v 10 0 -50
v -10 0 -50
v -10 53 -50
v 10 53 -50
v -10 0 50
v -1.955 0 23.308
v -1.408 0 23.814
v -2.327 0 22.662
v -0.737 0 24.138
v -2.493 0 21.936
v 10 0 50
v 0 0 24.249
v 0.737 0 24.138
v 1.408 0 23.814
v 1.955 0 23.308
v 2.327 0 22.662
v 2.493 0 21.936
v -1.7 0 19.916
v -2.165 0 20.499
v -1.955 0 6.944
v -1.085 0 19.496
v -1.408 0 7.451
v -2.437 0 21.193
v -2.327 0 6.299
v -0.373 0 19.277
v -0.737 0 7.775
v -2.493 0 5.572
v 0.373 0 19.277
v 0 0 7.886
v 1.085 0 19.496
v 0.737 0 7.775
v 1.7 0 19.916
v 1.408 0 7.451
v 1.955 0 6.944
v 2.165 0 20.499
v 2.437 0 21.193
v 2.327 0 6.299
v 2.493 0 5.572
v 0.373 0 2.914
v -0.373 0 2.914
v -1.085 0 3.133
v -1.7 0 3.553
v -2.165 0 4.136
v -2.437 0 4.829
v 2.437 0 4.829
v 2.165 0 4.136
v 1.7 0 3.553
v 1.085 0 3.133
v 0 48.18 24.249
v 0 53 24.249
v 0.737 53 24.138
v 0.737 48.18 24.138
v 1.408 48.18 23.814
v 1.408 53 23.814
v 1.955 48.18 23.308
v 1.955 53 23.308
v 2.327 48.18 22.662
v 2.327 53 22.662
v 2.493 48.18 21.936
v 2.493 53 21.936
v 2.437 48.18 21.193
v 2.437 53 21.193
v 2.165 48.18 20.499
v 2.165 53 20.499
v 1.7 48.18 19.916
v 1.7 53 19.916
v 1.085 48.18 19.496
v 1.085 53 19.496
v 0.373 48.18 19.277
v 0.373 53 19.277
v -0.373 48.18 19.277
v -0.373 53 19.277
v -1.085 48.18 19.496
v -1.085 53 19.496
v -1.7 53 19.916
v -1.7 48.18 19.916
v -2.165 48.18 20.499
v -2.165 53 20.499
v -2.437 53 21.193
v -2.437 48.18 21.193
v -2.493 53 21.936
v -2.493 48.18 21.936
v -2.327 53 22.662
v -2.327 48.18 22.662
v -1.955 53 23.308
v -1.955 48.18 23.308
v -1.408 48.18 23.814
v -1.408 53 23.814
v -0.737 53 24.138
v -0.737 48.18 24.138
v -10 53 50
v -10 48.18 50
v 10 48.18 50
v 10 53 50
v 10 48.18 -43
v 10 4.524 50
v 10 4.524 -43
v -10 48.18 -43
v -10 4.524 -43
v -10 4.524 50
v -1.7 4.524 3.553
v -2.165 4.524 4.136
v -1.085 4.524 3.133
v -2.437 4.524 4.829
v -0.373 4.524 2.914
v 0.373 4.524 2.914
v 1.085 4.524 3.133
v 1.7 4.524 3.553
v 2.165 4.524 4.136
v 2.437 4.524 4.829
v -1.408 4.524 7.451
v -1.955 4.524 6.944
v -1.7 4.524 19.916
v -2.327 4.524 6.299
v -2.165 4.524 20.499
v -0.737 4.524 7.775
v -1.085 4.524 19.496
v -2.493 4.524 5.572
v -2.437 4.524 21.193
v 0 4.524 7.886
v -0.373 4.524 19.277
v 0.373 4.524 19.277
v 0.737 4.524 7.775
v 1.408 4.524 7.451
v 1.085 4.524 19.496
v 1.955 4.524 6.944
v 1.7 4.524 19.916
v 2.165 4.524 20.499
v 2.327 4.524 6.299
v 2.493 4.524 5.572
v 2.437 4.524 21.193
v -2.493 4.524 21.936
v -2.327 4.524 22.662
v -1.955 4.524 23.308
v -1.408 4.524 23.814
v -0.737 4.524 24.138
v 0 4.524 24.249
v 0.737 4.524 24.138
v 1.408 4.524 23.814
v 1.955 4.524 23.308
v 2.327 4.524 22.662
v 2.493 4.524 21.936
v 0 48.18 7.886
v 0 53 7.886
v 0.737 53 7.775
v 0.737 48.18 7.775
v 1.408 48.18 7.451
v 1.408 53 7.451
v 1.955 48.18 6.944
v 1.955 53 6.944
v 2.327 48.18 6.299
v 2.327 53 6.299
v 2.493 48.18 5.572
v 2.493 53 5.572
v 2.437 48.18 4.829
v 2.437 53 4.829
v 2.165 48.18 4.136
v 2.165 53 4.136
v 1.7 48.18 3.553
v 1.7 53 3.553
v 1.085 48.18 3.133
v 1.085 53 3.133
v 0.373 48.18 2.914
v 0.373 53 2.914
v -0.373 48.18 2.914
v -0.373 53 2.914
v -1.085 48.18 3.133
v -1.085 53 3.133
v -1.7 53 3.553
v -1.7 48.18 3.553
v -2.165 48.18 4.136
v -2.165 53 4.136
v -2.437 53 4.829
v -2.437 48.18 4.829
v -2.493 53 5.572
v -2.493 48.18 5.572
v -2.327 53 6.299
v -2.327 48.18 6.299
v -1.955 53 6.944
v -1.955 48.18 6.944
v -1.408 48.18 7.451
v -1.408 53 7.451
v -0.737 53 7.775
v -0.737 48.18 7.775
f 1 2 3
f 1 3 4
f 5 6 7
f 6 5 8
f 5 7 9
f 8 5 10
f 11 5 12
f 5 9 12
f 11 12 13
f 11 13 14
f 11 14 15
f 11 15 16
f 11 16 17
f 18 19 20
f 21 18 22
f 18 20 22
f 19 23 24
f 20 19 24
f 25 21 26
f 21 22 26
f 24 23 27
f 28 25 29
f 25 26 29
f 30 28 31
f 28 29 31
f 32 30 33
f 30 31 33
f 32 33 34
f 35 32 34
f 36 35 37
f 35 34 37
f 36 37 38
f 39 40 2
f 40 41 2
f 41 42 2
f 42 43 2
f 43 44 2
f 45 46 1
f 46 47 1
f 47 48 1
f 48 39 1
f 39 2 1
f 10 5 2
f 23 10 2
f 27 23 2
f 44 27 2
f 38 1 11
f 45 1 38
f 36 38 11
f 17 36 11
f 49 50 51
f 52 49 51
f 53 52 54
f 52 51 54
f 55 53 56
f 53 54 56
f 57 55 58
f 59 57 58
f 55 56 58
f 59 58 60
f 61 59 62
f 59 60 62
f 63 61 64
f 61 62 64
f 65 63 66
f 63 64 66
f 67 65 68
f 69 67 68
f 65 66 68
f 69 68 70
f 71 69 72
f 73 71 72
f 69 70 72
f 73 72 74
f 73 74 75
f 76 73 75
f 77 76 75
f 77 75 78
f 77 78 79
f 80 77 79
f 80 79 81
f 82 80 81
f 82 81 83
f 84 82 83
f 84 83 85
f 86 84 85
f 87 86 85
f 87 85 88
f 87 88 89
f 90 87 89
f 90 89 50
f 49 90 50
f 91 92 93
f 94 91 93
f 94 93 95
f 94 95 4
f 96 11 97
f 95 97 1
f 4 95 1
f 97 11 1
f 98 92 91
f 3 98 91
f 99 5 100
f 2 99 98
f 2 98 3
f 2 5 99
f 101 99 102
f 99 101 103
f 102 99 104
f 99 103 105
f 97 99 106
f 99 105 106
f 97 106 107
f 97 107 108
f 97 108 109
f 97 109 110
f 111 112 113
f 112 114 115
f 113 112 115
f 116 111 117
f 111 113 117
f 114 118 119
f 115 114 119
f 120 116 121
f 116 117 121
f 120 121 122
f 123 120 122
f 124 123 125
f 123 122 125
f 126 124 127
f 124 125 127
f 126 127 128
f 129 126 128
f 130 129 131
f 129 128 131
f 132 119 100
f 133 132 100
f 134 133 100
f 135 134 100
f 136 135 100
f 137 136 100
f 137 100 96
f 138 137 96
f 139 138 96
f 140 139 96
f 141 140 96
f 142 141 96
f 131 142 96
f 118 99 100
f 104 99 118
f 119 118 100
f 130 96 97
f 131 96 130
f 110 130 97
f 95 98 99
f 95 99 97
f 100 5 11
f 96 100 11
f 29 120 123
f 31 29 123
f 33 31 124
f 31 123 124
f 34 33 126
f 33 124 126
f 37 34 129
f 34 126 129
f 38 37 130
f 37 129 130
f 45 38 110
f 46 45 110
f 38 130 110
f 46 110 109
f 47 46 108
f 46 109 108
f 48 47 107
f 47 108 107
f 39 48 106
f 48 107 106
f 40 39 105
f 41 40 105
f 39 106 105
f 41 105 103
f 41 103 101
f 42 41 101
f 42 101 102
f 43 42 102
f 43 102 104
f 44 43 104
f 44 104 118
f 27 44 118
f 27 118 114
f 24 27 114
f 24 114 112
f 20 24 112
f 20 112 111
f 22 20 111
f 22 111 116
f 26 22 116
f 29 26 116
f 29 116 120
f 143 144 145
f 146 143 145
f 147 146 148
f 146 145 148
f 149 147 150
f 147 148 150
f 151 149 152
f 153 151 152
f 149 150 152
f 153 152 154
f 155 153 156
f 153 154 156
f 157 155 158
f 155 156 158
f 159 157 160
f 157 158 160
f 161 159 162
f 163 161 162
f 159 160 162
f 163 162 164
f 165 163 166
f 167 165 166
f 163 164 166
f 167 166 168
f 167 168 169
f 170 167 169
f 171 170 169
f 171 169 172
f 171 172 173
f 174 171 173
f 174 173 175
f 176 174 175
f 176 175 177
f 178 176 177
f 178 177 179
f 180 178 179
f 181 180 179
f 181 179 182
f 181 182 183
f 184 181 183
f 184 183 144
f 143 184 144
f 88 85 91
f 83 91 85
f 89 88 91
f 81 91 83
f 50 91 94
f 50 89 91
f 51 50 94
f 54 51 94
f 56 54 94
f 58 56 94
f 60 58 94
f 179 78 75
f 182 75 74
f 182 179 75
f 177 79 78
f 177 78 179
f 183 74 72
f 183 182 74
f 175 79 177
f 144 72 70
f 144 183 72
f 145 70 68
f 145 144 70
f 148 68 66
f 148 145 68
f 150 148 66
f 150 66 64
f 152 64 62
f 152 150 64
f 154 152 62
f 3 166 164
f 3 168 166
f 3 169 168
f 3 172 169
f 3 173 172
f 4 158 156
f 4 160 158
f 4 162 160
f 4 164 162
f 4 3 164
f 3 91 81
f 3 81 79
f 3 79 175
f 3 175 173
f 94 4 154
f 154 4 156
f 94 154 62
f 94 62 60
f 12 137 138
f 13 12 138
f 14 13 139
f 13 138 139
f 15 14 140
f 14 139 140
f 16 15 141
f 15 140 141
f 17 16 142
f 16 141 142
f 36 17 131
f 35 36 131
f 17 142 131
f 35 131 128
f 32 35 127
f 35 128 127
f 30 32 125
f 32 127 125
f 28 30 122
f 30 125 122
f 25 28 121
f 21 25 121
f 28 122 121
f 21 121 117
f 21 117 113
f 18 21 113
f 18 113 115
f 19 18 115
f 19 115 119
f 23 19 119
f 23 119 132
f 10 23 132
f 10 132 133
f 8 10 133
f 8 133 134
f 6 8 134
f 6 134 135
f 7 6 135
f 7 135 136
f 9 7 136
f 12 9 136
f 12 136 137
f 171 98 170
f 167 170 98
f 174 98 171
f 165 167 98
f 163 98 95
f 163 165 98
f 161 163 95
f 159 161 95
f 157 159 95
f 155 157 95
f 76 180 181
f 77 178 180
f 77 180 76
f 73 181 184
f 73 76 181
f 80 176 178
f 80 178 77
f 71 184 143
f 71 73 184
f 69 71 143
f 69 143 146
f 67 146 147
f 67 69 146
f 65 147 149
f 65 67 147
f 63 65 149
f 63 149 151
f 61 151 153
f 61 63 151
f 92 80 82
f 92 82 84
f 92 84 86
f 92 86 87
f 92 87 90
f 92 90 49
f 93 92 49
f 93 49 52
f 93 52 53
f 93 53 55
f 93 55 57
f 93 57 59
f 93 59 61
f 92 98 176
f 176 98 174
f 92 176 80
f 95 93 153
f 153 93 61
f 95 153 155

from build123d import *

# Parameters (mm, degrees)
SKETCH1_W           = 20
SKETCH1_H           = 100
BOSS_EXTRUDE1_DEPTH = 53
SKETCH2_W           = 20
SKETCH2_H           = 22.115254232
CUT_EXTRUDE1_DEPTH  = 93
SKETCH4_W           = 20
SKETCH4_H           = 7.428579278
CUT_EXTRUDE3_DEPTH  = 93
SKETCH5_W           = 20
SKETCH5_H           = 14.111734172
CUT_EXTRUDE4_DEPTH  = 93
SKETCH6_R           = 2.5
CUT_EXTRUDE5_DEPTH  = 70
SKETCH8_R           = 2.5
CUT_EXTRUDE7_DEPTH  = 67


with BuildPart() as part:
    # Sketch1 → Boss-Extrude1 (new body)
    with BuildSketch(Plane(origin=(0, 0, 0), x_dir=(1, 0, 0), z_dir=(0, 1, 0))):
        Rectangle(SKETCH1_W, SKETCH1_H)
    extrude(amount=BOSS_EXTRUDE1_DEPTH)

    # Sketch2 → Cut-Extrude1 (cut)
    with BuildSketch(Plane.XY.offset(50)):
        with Locations((0, 15.581680587)):
            Rectangle(SKETCH2_W, SKETCH2_H)
    extrude(amount=-CUT_EXTRUDE1_DEPTH, mode=Mode.SUBTRACT)

    # Sketch4 → Cut-Extrude3 (cut)
    with BuildSketch(Plane.XY.offset(50)):
        with Locations((0, 30.353597342)):
            Rectangle(SKETCH4_W, SKETCH4_H)
    extrude(amount=-CUT_EXTRUDE3_DEPTH, mode=Mode.SUBTRACT)

    # Sketch5 → Cut-Extrude4 (cut)
    with BuildSketch(Plane.XY.offset(50)):
        with Locations((0, 41.123754067)):
            Rectangle(SKETCH5_W, SKETCH5_H)
    extrude(amount=-CUT_EXTRUDE4_DEPTH, mode=Mode.SUBTRACT)

    # Sketch6 → Cut-Extrude5 (cut)
    with BuildSketch(Plane(origin=(0, 53, 0), x_dir=(1, 0, 0), z_dir=(0, 1, 0))):
        with Locations(Location((0, -5.385612406, 0), (0, 0, 270))):
            Circle(SKETCH6_R)
    extrude(amount=-CUT_EXTRUDE5_DEPTH, mode=Mode.SUBTRACT)

    # Sketch8 → Cut-Extrude7 (cut)
    with BuildSketch(Plane(origin=(0, 53, 0), x_dir=(1, 0, 0), z_dir=(0, 1, 0))):
        with Locations(Location((0, -21.748837603, 0), (0, 0, 270))):
            Circle(SKETCH8_R)
    extrude(amount=-CUT_EXTRUDE7_DEPTH, mode=Mode.SUBTRACT)


solid = part.part
